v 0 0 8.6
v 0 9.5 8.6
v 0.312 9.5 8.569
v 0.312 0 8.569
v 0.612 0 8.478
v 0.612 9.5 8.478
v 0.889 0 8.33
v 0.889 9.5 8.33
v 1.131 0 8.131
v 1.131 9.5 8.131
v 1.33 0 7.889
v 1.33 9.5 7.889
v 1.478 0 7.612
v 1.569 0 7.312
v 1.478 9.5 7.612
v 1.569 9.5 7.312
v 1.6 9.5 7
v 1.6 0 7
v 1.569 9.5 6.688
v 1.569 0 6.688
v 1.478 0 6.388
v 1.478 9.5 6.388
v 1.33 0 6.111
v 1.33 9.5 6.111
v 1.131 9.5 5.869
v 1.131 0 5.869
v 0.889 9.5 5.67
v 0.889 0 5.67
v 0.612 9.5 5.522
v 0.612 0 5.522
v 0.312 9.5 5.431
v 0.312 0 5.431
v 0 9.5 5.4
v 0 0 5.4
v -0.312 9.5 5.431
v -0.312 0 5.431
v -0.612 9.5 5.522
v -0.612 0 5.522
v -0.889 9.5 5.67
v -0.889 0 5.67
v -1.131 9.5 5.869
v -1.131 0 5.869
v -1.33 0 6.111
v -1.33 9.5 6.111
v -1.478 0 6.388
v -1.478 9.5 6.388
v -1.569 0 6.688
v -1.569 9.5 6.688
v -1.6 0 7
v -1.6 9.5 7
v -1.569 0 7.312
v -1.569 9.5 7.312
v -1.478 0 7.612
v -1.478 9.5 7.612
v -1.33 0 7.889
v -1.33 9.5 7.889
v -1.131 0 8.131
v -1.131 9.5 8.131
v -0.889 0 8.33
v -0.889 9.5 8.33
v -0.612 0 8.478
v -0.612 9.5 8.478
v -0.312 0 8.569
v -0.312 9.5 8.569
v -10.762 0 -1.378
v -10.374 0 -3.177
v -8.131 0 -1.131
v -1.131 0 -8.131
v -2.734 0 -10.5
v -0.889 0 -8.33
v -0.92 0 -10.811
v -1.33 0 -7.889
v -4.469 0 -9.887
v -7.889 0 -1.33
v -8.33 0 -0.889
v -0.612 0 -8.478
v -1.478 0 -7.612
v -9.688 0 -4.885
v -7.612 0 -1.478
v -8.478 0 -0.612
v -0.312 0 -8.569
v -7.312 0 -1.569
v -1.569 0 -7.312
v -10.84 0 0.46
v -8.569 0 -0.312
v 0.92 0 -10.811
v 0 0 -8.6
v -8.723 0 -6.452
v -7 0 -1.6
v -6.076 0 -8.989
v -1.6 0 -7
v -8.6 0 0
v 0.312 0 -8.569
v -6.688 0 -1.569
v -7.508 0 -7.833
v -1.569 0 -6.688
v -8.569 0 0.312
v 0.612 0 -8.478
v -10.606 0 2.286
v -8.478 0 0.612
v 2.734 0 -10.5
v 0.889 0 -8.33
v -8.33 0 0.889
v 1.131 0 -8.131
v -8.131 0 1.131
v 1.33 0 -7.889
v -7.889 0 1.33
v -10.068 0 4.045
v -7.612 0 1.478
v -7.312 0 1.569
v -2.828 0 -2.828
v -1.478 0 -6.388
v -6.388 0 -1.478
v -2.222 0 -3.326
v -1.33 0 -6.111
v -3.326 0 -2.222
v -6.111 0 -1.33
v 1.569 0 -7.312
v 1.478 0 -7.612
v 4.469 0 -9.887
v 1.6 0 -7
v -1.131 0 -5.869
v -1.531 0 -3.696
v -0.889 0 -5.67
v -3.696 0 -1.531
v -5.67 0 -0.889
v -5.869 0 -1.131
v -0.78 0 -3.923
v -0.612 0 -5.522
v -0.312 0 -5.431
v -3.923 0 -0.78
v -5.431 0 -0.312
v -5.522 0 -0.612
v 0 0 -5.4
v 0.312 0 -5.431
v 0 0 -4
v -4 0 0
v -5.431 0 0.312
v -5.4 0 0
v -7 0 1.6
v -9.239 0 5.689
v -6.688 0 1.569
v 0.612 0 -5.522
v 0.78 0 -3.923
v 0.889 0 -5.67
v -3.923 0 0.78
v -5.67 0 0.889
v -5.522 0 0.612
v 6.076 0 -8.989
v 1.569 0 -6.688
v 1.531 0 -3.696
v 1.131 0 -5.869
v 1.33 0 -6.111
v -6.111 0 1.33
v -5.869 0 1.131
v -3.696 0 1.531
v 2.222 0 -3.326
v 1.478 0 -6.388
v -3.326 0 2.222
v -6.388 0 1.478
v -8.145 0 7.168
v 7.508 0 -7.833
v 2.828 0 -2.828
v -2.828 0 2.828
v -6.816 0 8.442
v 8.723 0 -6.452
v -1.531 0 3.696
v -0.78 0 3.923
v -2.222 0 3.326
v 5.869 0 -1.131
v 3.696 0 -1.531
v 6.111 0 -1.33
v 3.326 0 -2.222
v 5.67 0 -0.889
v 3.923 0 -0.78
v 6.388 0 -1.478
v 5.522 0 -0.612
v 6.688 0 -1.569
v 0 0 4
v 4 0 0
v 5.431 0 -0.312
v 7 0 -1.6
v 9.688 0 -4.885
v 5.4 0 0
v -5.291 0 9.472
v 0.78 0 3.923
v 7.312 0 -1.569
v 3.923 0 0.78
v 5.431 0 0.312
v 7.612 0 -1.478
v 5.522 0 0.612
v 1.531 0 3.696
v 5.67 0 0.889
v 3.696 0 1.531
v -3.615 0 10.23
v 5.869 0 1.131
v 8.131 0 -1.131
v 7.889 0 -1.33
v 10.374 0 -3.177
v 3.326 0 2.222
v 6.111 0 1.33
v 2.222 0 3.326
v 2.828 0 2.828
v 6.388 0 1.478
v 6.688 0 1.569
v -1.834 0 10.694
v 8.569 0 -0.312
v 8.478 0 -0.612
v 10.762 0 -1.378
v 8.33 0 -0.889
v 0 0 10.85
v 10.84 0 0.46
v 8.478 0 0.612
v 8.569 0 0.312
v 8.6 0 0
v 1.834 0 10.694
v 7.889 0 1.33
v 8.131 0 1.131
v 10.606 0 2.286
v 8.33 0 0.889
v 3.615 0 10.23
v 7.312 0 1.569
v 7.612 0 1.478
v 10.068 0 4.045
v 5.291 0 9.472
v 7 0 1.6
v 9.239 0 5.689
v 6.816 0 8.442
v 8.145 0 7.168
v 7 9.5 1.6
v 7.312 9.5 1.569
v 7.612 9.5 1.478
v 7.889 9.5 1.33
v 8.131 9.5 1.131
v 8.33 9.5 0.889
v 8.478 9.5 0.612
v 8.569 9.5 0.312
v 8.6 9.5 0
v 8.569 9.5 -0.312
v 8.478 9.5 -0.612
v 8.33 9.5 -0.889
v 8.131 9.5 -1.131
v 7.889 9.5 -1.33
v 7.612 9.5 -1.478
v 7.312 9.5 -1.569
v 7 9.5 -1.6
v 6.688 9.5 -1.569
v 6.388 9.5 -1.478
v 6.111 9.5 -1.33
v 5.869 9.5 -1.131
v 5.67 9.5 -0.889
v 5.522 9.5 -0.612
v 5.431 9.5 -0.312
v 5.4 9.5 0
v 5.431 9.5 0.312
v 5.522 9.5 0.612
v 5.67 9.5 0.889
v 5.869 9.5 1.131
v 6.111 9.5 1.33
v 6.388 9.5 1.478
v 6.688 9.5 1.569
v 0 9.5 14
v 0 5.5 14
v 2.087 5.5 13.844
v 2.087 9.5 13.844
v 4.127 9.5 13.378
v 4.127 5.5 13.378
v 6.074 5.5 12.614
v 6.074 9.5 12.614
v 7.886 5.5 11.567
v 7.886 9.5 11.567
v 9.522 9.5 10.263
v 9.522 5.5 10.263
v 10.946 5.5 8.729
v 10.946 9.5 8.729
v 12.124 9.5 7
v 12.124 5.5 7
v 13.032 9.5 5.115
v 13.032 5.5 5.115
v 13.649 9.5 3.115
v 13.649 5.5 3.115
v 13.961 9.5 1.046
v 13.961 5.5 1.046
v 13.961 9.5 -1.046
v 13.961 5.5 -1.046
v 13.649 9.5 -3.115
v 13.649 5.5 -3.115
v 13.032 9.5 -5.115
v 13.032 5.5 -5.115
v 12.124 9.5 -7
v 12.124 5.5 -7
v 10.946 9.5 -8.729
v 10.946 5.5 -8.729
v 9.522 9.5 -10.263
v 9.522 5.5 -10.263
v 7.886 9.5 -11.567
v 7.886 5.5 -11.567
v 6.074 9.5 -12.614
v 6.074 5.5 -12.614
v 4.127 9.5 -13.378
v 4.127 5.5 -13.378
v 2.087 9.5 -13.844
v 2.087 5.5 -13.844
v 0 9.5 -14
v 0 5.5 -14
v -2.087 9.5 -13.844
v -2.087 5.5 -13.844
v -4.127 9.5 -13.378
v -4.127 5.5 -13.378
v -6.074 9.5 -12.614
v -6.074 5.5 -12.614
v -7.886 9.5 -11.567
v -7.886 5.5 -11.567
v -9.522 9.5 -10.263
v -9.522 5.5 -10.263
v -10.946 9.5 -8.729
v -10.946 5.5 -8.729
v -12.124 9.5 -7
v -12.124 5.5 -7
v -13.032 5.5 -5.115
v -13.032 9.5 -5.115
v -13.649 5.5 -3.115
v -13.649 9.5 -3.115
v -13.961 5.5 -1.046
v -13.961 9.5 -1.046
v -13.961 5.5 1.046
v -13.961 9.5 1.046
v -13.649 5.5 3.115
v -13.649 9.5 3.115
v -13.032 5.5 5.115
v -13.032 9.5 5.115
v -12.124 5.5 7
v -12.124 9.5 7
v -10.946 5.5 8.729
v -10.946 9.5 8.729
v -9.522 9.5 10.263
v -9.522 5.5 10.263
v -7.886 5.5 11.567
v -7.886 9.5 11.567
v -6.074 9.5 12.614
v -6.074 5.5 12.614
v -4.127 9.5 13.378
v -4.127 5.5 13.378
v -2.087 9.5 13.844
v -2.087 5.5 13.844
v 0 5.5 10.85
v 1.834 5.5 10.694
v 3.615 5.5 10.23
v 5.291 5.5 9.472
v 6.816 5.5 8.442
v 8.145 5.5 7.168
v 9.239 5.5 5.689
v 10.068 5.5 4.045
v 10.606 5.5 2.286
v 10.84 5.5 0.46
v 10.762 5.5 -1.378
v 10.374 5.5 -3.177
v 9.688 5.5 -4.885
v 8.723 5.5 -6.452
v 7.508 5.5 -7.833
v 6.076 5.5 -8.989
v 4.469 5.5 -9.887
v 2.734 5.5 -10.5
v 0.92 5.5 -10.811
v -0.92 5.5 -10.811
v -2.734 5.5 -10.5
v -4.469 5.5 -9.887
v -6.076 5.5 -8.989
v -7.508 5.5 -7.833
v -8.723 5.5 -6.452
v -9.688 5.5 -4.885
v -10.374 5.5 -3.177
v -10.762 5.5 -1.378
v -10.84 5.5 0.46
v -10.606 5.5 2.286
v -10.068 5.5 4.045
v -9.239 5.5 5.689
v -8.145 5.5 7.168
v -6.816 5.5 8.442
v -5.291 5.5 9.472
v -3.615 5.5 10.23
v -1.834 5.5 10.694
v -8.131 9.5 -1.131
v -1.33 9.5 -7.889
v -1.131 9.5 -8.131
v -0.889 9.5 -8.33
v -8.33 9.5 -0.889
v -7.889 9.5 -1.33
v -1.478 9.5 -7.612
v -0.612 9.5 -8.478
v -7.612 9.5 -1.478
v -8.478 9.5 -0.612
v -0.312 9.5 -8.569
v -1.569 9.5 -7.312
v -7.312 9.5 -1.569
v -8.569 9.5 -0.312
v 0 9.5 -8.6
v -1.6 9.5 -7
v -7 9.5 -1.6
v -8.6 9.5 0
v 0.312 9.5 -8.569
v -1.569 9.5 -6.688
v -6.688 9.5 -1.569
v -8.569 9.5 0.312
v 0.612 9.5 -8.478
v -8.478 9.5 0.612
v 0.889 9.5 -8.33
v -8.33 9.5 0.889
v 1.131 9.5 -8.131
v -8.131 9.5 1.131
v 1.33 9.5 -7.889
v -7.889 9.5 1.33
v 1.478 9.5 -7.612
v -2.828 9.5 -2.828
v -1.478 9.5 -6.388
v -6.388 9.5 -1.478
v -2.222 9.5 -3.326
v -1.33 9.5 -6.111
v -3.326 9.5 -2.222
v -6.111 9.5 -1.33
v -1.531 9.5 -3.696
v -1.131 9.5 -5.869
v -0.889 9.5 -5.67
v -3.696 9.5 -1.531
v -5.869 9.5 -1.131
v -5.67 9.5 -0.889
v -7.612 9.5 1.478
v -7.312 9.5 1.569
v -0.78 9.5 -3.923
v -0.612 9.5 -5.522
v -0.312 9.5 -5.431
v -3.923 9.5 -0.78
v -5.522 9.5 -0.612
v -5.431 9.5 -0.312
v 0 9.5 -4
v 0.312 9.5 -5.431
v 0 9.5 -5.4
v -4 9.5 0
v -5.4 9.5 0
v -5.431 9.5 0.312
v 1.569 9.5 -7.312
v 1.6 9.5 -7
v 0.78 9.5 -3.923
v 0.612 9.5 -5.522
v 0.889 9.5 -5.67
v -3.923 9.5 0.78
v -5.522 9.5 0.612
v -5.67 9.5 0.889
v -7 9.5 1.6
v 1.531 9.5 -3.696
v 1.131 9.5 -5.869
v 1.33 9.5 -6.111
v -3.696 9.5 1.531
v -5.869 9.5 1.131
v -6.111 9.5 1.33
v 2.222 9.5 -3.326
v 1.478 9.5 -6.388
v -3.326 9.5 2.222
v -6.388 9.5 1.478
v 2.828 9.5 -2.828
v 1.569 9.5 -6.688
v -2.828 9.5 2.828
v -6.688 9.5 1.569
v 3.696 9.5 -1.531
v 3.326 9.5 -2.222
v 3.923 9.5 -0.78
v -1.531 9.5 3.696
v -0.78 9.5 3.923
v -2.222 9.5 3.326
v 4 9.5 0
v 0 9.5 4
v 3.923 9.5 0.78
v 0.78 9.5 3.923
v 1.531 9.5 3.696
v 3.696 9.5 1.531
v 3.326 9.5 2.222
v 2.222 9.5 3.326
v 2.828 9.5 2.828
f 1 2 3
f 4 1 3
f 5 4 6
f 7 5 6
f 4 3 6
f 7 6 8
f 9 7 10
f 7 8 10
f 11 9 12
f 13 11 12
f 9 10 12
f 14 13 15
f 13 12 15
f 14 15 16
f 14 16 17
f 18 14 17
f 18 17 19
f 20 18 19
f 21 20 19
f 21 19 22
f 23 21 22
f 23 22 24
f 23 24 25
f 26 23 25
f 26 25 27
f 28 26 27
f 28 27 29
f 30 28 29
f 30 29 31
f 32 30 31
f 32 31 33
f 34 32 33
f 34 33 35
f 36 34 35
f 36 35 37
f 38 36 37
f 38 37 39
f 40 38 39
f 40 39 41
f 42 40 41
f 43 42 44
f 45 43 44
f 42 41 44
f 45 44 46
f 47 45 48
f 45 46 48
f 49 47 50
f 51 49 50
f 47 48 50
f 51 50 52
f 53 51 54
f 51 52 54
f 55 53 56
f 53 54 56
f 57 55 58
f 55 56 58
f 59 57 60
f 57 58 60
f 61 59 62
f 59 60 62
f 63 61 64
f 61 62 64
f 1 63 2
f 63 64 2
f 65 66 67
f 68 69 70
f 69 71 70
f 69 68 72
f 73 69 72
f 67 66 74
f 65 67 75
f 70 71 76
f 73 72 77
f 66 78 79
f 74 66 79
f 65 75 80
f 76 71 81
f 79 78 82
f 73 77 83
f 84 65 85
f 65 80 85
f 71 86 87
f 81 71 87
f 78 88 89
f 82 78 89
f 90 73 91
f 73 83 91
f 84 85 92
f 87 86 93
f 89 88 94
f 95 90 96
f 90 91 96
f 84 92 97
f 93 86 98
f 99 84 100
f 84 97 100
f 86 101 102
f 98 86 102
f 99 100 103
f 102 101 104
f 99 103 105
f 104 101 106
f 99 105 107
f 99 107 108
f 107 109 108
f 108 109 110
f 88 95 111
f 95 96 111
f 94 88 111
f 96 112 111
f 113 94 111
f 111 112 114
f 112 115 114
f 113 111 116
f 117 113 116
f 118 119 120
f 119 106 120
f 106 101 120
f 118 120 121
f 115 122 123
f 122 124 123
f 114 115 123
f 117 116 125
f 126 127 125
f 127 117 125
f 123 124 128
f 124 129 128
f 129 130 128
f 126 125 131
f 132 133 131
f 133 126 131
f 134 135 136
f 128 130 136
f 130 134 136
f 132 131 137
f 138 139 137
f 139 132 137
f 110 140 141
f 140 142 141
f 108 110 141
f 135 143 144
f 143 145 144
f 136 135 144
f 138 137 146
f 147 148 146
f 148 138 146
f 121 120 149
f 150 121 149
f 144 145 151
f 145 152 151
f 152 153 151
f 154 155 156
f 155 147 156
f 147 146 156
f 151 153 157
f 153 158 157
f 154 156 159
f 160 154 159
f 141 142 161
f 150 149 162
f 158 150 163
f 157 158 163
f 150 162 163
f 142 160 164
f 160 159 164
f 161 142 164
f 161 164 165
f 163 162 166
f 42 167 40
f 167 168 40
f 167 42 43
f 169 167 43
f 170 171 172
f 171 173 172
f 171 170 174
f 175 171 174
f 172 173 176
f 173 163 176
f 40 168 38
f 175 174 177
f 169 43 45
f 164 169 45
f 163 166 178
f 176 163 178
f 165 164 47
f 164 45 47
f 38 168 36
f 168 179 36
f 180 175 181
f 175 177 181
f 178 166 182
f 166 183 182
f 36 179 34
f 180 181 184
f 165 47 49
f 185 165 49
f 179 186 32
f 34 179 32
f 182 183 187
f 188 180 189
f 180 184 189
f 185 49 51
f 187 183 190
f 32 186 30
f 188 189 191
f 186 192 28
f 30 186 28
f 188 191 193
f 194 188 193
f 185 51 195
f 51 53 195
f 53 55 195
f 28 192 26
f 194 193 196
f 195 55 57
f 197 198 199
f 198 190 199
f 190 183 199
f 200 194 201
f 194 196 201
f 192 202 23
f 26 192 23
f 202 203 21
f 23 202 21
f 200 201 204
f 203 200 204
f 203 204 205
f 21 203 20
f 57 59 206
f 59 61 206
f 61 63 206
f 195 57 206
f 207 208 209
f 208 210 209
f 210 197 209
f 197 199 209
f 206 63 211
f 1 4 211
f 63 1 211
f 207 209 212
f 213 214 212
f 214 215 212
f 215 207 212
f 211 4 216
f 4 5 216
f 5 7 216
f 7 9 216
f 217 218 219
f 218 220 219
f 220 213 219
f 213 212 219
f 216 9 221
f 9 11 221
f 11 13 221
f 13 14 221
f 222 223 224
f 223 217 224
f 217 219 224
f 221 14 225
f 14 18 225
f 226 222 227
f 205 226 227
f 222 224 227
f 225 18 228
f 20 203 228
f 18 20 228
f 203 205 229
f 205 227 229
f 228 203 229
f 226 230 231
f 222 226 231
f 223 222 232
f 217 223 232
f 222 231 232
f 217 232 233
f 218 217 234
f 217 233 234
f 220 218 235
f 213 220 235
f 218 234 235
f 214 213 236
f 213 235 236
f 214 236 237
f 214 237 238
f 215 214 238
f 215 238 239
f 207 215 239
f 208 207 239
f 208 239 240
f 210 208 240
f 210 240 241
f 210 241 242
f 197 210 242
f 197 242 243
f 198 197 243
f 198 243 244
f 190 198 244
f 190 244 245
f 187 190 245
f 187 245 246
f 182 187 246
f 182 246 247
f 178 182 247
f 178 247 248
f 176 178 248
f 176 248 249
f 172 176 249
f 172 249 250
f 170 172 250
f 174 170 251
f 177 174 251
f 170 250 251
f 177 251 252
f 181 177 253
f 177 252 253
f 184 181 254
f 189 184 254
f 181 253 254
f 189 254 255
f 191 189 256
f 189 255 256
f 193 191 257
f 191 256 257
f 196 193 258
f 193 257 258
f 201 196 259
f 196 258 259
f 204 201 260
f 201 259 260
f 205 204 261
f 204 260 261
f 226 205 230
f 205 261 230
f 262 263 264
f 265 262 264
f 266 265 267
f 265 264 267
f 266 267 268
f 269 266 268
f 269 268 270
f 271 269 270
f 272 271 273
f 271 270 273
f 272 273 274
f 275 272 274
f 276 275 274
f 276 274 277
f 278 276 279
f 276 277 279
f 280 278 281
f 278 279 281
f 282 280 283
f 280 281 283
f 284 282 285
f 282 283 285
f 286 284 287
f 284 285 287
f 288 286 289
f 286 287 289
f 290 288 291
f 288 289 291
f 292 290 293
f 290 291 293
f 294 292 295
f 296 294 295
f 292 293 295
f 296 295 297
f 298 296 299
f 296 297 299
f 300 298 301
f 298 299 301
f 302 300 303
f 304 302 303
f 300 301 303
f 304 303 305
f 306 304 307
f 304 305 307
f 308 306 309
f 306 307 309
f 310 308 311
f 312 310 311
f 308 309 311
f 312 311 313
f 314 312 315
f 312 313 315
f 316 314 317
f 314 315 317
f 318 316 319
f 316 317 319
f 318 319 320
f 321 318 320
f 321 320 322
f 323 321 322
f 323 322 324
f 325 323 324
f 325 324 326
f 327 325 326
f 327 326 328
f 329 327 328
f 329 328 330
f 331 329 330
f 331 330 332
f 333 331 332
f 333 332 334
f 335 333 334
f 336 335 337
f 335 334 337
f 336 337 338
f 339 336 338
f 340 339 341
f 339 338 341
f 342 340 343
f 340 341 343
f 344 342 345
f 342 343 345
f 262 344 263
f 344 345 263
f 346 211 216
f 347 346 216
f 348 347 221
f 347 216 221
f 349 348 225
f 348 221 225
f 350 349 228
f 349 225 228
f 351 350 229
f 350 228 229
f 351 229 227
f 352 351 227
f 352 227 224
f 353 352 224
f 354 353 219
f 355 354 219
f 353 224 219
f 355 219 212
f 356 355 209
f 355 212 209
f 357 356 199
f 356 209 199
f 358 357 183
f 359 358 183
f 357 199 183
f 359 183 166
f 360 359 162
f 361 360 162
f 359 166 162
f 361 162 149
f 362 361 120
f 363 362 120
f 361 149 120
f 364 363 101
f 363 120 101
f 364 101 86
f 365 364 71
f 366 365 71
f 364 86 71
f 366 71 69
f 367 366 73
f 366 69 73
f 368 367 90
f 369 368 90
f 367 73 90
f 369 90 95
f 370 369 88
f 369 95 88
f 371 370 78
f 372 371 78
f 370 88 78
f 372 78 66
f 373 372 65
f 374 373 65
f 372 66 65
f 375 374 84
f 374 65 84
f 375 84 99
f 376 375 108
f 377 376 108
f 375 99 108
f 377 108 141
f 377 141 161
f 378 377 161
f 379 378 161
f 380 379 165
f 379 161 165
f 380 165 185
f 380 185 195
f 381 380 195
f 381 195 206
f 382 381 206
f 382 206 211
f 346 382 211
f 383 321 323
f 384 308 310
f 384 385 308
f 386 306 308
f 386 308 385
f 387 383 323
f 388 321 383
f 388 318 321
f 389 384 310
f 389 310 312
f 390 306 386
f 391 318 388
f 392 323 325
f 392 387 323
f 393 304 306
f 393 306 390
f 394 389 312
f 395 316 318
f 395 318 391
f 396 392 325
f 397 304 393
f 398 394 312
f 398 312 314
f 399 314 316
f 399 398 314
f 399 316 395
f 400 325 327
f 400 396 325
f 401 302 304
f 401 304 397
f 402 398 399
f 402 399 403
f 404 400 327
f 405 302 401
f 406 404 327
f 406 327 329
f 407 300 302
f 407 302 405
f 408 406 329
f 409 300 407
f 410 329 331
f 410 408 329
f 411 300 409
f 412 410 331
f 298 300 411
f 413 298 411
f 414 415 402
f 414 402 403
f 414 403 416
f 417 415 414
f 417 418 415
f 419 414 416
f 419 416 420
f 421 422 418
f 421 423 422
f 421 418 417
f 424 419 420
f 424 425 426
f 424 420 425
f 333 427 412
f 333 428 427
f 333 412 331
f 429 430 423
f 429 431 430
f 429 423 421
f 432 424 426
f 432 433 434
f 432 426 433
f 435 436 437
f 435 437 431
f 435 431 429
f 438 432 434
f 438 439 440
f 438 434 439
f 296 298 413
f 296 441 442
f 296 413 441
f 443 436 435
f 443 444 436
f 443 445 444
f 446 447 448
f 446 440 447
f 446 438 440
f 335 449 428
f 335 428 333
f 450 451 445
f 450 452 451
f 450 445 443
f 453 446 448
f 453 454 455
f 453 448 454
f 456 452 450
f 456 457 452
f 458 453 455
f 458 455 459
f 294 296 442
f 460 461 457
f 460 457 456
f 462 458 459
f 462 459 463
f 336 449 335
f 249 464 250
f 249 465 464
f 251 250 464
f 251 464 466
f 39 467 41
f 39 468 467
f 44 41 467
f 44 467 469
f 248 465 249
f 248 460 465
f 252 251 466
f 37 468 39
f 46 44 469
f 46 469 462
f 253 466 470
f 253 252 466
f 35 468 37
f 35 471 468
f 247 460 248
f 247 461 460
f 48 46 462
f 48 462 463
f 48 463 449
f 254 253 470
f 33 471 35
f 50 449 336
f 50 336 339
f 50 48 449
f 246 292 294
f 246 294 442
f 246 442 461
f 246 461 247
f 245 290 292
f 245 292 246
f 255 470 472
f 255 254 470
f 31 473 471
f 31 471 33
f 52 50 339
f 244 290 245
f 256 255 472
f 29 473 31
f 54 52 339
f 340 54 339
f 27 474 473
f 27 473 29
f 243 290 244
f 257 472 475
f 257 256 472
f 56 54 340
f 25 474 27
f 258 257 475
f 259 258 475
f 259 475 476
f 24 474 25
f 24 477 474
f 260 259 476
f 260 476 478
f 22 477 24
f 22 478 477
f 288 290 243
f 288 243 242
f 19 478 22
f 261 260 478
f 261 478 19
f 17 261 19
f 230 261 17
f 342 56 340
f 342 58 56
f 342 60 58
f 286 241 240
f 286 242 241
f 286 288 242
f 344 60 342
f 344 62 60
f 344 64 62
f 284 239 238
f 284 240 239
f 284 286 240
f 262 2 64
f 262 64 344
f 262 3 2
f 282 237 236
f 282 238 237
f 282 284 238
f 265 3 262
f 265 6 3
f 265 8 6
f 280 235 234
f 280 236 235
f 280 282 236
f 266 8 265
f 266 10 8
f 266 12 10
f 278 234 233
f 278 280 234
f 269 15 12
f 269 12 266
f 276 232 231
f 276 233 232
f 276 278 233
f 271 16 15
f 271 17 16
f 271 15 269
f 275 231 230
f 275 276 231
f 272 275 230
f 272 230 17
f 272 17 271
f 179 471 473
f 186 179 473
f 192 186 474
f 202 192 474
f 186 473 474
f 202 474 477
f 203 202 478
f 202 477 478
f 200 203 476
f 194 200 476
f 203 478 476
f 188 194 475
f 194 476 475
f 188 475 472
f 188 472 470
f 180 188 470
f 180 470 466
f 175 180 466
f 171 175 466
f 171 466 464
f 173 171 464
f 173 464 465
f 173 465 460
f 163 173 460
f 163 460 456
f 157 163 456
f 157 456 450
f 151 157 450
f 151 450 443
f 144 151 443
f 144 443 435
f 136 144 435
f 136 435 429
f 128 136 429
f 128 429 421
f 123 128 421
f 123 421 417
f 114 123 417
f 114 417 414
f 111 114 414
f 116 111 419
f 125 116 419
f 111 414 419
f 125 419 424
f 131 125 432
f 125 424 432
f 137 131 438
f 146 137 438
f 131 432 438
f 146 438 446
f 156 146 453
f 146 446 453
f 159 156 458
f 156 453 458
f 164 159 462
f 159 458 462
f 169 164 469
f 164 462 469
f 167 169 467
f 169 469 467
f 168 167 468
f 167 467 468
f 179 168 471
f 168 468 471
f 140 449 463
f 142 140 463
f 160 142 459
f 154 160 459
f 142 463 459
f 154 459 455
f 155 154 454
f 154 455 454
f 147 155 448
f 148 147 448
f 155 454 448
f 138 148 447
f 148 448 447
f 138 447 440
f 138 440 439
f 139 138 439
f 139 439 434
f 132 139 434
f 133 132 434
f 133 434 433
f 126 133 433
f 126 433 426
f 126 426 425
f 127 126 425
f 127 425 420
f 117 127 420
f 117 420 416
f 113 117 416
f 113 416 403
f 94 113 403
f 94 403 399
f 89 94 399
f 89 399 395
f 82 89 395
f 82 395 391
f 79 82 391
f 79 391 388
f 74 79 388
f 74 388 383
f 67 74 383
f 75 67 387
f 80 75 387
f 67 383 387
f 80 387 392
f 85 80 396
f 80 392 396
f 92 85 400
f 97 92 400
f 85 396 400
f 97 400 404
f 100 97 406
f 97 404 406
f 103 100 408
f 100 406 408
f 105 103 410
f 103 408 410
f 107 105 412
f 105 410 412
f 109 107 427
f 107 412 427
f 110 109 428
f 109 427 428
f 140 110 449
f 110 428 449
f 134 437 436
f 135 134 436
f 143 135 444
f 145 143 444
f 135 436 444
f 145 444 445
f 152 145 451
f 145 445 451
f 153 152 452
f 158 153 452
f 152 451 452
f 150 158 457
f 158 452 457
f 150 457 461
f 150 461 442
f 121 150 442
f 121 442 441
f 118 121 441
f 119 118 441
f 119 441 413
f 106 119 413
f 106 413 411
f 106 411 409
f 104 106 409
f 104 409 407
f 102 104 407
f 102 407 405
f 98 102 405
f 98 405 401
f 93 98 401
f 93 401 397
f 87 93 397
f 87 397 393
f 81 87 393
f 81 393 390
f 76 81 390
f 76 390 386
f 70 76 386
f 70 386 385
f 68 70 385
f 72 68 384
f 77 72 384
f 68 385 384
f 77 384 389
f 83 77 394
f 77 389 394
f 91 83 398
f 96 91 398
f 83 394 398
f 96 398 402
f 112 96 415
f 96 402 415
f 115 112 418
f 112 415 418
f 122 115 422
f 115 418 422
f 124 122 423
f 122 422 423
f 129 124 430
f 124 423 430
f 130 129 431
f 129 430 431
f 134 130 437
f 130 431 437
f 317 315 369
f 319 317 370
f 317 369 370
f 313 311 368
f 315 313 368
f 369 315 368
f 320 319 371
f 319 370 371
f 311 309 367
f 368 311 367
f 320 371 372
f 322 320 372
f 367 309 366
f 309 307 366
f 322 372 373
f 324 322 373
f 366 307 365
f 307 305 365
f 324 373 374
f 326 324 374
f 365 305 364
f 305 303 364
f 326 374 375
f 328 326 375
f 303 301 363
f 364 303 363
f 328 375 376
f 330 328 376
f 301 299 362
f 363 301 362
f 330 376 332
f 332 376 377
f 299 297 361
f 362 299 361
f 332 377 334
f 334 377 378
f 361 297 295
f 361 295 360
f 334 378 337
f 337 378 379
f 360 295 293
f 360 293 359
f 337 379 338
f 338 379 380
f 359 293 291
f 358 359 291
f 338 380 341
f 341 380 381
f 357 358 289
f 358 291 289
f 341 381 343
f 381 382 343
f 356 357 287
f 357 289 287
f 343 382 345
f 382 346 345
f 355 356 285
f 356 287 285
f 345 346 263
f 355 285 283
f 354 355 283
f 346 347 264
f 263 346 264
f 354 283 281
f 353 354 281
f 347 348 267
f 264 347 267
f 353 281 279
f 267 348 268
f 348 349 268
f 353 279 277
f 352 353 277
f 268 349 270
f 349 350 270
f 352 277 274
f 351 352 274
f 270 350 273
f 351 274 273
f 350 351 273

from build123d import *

# Parameters (mm, degrees)
SKETCH_3_R          = 10.85
EXTRUDE_1_DEPTH     = 5.5
SKETCH_4_R          = 14
EXTRUDE_2_DEPTH     = 4
SKETCH_5_R          = 4
SKETCH_5_R_2        = 1.6
CUT_EXTRUDE_1_DEPTH = 50


with BuildPart() as part:
    # 草图3 → 凸台-拉伸1 (new body)
    with BuildSketch(Plane(origin=(0, 0, 0), x_dir=(1, 0, 0), z_dir=(0, 1, 0))):
        with Locations(Location((0, 0, 0), (0, 0, 270))):
            Circle(SKETCH_3_R)
    extrude(amount=EXTRUDE_1_DEPTH)

    # 草图4 → 凸台-拉伸2 (add)
    with BuildSketch(Plane(origin=(0, 5.5, 0), x_dir=(1, 0, 0), z_dir=(0, 1, 0))):
        with Locations(Location((0, 0, 0), (0, 0, 270))):
            Circle(SKETCH_4_R)
    extrude(amount=EXTRUDE_2_DEPTH)

    # 草图5 → 切除-拉伸1 (cut)
    with BuildSketch(Plane(origin=(0, 9.5, 0), x_dir=(1, 0, 0), z_dir=(0, 1, 0))):
        with Locations(Location((0, 0, 0), (0, 0, 270))):
            Circle(SKETCH_5_R)
        with Locations(Location((0, 7, 0), (0, 0, 270))):
            Circle(SKETCH_5_R_2)
        with Locations(Location((7, 0, 0), (0, 0, 270))):
            Circle(SKETCH_5_R_2)
        with Locations(Location((0, -7, 0), (0, 0, 270))):
            Circle(SKETCH_5_R_2)
        with Locations(Location((-7, 0, 0), (0, 0, 270))):
            Circle(SKETCH_5_R_2)
    extrude(amount=-CUT_EXTRUDE_1_DEPTH, mode=Mode.SUBTRACT)


solid = part.part
